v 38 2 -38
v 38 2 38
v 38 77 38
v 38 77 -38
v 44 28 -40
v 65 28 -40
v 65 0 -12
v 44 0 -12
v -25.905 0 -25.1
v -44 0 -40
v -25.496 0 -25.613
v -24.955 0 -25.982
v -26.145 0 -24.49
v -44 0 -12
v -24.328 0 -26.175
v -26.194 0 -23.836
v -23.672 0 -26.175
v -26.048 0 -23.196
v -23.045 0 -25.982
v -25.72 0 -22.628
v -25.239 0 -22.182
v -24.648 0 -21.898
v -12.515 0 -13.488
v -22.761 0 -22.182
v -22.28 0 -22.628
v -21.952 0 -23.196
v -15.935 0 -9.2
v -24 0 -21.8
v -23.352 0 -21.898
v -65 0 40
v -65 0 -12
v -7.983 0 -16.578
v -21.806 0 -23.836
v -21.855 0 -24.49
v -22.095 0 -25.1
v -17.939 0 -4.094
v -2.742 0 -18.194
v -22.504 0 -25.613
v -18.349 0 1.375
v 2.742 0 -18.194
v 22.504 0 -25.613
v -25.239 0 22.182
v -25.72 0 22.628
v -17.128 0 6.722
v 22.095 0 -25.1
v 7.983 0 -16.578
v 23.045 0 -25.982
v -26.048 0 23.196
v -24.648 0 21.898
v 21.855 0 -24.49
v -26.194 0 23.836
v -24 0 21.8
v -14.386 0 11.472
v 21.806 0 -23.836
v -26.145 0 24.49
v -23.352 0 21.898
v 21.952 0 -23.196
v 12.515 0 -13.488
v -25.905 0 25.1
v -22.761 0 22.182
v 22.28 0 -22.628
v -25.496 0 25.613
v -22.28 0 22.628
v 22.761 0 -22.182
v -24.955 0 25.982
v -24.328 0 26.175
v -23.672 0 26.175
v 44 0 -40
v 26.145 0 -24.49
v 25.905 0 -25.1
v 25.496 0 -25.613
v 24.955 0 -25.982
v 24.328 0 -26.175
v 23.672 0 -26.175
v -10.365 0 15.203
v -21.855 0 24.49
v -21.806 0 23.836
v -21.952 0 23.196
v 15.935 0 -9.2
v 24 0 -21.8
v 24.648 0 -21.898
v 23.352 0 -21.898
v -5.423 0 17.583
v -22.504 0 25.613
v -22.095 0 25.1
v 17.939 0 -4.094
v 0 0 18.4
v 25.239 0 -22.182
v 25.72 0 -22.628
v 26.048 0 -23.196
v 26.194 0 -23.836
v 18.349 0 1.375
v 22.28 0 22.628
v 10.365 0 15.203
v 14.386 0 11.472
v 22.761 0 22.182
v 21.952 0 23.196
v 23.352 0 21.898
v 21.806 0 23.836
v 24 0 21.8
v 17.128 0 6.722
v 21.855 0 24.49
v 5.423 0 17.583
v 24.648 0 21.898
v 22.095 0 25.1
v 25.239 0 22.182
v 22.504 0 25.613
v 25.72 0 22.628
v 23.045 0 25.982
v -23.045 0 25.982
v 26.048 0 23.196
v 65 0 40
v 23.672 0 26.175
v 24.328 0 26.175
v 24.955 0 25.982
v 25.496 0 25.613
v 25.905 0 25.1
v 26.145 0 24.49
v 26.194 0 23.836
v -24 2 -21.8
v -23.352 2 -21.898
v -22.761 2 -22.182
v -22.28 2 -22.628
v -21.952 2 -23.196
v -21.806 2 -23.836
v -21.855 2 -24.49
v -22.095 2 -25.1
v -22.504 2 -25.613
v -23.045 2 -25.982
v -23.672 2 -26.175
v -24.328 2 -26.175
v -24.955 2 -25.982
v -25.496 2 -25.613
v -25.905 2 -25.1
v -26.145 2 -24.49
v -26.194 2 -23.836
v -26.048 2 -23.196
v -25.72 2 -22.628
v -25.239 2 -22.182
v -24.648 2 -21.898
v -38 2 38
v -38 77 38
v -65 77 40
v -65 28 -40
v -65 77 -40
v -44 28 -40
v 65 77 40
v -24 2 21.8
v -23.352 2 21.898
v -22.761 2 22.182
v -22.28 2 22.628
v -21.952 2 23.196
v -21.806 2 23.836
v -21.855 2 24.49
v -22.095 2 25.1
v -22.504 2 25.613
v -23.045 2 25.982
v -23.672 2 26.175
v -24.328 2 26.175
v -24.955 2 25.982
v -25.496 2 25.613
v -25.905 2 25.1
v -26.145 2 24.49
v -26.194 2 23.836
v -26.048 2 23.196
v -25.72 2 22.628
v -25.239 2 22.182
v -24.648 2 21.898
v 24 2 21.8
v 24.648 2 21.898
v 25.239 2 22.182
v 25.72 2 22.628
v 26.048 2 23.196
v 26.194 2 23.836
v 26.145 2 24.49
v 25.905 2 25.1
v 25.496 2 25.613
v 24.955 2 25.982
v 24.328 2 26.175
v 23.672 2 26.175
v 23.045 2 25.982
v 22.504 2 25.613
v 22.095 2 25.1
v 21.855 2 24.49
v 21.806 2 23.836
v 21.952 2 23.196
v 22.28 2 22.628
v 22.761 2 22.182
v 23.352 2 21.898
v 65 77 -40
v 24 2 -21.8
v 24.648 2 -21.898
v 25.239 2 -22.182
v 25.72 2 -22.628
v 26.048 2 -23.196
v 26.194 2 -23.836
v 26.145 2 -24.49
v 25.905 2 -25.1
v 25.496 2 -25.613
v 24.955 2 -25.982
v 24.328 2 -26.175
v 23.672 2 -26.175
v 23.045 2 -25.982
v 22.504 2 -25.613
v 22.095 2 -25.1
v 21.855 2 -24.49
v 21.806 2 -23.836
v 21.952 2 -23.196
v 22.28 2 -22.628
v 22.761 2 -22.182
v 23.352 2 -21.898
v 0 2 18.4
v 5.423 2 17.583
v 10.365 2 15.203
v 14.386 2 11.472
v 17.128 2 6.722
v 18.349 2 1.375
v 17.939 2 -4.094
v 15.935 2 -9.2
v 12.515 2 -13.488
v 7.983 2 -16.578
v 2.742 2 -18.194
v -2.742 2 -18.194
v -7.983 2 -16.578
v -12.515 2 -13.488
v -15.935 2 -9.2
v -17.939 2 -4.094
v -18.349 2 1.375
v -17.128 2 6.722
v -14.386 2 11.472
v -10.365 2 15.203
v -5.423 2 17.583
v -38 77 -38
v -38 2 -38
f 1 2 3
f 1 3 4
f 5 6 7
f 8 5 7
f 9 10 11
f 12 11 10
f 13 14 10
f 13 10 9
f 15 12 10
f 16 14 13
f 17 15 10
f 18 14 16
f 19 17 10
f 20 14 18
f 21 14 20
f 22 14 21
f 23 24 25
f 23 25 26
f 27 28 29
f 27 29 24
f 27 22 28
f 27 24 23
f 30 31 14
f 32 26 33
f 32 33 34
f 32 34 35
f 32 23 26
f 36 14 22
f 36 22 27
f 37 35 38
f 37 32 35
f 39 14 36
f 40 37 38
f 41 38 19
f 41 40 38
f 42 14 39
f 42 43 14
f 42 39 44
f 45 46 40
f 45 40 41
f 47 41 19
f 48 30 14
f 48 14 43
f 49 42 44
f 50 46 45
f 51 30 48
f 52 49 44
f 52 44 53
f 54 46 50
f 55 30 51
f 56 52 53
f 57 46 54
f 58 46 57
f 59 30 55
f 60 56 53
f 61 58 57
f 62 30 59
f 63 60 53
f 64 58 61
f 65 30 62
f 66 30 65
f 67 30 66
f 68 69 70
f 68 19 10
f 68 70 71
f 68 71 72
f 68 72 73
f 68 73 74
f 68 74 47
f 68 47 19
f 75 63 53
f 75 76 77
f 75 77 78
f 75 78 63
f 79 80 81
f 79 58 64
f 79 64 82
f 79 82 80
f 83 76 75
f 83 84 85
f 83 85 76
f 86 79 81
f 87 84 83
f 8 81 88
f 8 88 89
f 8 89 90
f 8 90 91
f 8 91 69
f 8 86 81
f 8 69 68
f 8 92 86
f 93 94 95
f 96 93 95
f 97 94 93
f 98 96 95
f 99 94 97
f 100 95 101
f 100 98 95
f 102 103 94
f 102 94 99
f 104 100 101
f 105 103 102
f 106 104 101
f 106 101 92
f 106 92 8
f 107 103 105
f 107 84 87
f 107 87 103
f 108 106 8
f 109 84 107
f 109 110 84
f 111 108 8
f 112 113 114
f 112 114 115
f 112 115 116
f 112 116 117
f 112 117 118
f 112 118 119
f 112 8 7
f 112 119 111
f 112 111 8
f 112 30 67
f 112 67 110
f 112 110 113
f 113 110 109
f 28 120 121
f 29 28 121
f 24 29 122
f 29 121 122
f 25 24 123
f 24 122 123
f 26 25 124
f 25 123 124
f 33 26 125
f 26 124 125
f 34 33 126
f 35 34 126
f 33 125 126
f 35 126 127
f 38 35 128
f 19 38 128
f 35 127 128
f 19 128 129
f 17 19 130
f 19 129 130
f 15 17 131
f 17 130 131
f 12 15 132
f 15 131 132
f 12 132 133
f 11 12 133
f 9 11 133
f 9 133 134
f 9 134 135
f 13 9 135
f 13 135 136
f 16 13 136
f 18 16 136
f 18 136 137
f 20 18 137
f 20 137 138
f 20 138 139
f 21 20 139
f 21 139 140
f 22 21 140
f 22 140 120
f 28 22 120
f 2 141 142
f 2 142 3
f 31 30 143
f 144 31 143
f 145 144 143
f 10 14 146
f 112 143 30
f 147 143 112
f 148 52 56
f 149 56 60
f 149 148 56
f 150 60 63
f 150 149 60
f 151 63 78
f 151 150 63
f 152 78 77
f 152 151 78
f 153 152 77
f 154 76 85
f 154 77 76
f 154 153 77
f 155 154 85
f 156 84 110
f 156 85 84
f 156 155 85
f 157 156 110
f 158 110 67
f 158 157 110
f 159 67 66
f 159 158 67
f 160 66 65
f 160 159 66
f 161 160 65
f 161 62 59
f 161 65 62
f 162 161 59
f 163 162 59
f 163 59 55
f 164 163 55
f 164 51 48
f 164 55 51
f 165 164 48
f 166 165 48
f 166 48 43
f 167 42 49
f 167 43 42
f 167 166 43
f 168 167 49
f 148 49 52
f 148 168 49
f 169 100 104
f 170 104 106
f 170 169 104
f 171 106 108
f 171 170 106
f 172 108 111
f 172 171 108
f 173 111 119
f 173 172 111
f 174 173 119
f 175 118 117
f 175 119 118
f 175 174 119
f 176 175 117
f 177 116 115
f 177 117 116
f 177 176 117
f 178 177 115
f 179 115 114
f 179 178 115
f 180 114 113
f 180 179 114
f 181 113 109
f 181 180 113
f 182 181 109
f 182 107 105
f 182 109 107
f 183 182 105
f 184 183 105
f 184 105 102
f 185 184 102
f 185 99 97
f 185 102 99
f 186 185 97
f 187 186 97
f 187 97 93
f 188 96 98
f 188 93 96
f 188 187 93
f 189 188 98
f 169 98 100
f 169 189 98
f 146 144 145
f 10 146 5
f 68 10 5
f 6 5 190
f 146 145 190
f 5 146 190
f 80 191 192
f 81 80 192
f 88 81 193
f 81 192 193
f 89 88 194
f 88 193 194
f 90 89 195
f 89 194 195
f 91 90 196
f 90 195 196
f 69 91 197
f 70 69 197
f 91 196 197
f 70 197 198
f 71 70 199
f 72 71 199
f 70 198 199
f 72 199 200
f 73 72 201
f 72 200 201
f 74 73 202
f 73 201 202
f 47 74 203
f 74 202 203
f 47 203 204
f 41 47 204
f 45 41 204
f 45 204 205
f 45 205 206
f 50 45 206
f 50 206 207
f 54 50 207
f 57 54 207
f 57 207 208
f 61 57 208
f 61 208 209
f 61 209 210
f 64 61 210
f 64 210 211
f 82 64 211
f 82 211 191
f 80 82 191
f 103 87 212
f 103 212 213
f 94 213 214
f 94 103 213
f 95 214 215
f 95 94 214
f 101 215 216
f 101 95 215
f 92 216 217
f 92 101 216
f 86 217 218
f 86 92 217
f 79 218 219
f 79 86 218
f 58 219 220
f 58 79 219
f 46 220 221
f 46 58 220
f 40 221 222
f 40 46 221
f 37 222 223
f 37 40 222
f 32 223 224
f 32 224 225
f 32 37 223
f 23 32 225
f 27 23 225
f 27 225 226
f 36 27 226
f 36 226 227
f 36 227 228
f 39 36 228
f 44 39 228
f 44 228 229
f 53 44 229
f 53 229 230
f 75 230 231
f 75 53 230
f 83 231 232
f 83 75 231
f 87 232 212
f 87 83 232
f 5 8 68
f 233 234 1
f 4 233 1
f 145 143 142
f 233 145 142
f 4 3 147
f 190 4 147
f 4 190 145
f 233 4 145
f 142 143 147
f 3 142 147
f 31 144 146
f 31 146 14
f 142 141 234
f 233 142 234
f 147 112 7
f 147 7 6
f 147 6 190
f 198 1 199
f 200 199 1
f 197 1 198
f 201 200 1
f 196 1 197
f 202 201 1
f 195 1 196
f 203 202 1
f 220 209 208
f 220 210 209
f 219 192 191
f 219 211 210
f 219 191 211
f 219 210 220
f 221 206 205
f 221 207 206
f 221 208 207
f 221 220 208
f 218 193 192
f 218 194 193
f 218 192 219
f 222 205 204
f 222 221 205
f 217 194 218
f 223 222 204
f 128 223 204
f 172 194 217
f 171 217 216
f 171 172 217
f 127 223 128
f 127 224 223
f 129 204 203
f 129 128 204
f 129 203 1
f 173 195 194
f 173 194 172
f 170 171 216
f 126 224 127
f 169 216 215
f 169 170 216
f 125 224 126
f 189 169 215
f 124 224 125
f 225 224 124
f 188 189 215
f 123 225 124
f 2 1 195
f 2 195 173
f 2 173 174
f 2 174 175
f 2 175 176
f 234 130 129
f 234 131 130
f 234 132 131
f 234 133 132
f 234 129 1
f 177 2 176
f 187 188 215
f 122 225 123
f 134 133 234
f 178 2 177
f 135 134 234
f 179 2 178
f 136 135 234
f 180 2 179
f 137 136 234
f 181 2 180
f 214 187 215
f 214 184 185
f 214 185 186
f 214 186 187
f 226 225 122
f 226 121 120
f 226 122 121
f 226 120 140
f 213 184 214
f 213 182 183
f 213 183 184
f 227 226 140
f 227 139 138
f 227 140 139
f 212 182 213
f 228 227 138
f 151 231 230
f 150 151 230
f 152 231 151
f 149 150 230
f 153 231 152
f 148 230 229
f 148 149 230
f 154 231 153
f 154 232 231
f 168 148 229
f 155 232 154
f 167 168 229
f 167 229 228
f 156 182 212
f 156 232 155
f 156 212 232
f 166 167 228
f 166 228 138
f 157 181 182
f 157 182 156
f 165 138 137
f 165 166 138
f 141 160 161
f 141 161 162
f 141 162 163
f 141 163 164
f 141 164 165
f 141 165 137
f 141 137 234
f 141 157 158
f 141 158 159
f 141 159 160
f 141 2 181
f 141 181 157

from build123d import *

# Parameters (mm, degrees)
SKETCH1_W               = 80
SKETCH1_H               = 80
SKETCH1_R               = 18.4
BOSS_EXTRUDE1_DEPTH     = 2
SKETCH2_W               = 4
SKETCH2_H               = 18.5
BOSS_EXTRUDE2_DEPTH     = 15.25
SKETCH3_R               = 2.2
CUT_EXTRUDE1_DEPTH      = 94.976393312
MIRROR2_COPY_1_SKETCH_W = 4
MIRROR2_COPY_1_SKETCH_H = 18.5
MIRROR2_COPY_1_DEPTH    = 15.25
MIRROR2_COPY_2_SKETCH_R = 2.2
MIRROR2_COPY_2_DEPTH    = 94.976393312
SKETCH4_R               = 2.2
CUT_EXTRUDE2_DEPTH      = 62.388618652
SKETCH5_W               = 4
SKETCH5_H               = 15.25
CUT_EXTRUDE3_DEPTH      = 93.258129723
SKETCH6_W               = 80
SKETCH6_H               = 80
SKETCH6_W_2             = 76
SKETCH6_H_2             = 76
BOSS_EXTRUDE3_DEPTH     = 75
SKETCH7_W               = 25
SKETCH7_H               = 77
BOSS_EXTRUDE4_DEPTH     = 80
CUT_EXTRUDE5_DEPTH      = 21


with BuildPart() as part:
    # Sketch1 → Boss-Extrude1 (new body)
    with BuildSketch(Plane(origin=(0, 0, 0), x_dir=(1, 0, 0), z_dir=(0, 1, 0))):
        Rectangle(SKETCH1_W, SKETCH1_H)
        with Locations(Location((0, 0, 0), (0, 0, 270))):
            Circle(SKETCH1_R, mode=Mode.SUBTRACT)
    extrude(amount=BOSS_EXTRUDE1_DEPTH)

    # Sketch2 → Boss-Extrude2 (add)
    with BuildSketch(Plane(origin=(0, 2, 0), x_dir=(1, 0, 0), z_dir=(0, 1, 0))):
        with Locations((42, -30.75)):
            Rectangle(SKETCH2_W, SKETCH2_H)
    boss_extrude2 = extrude(amount=-BOSS_EXTRUDE2_DEPTH)

    # Sketch3 → Cut-Extrude1 (cut, through all)
    with BuildSketch(Plane(origin=(44, 0, 0), x_dir=(0, 0, -1), z_dir=(1, 0, 0))):
        with Locations((-30.75, -8.125)):
            Circle(SKETCH3_R)
    cut_extrude1 = extrude(amount=-CUT_EXTRUDE1_DEPTH, mode=Mode.SUBTRACT)

    # Mirror1: Boss-Extrude2, Cut-Extrude1 across plane
    add(boss_extrude2.mirror(Plane(origin=(0, 0, 0), x_dir=(0, 0, 1), z_dir=(1, 0, 0))))
    add(cut_extrude1.mirror(Plane(origin=(0, 0, 0), x_dir=(0, 0, 1), z_dir=(1, 0, 0))), mode=Mode.SUBTRACT)

    # Mirror2: Boss-Extrude2, Cut-Extrude1 across plane
    add(boss_extrude2.mirror(Plane(origin=(0, 0, 0), x_dir=(1, 0, 0), z_dir=(0, 0, -1))))
    add(cut_extrude1.mirror(Plane(origin=(0, 0, 0), x_dir=(1, 0, 0), z_dir=(0, 0, -1))), mode=Mode.SUBTRACT)

    # Mirror2 copy 1 sketch → Mirror2 copy 1 (add)
    with BuildSketch(Plane(origin=(0, 2, 0), x_dir=(-1, 0, 0), z_dir=(0, 1, 0))):
        with Locations((42, -30.75)):
            Rectangle(MIRROR2_COPY_1_SKETCH_W, MIRROR2_COPY_1_SKETCH_H)
    extrude(amount=-MIRROR2_COPY_1_DEPTH)

    # Mirror2 copy 2 sketch → Mirror2 copy 2 (cut, through all)
    with BuildSketch(Plane.ZY.offset(44)):
        with Locations((-30.75, -8.125)):
            Circle(MIRROR2_COPY_2_SKETCH_R)
    extrude(amount=-MIRROR2_COPY_2_DEPTH, mode=Mode.SUBTRACT)

    # Sketch4 → Cut-Extrude2 (cut, through all)
    with BuildSketch(Plane(origin=(0, 2, 0), x_dir=(1, 0, 0), z_dir=(0, 1, 0))):
        with Locations(Location((-24, 24, 0), (0, 0, 270))):
            Circle(SKETCH4_R)
        with Locations(Location((24, 24, 0), (0, 0, 270))):
            Circle(SKETCH4_R)
    cut_extrude2 = extrude(amount=-CUT_EXTRUDE2_DEPTH, mode=Mode.SUBTRACT)

    # Mirror3: Cut-Extrude2 across plane
    add(cut_extrude2.mirror(Plane(origin=(0, 0, 0), x_dir=(1, 0, 0), z_dir=(0, 0, -1))), mode=Mode.SUBTRACT)

    # Sketch5 → Cut-Extrude3 (cut, through all)
    with BuildSketch(Plane.XY.offset(40)):
        with Locations((-42, -5.625)):
            Rectangle(SKETCH5_W, SKETCH5_H)
        with Locations((42, -5.625)):
            Rectangle(SKETCH5_W, SKETCH5_H)
    extrude(amount=-CUT_EXTRUDE3_DEPTH, mode=Mode.SUBTRACT)

    # Sketch6 → Boss-Extrude3 (add)
    with BuildSketch(Plane(origin=(0, 2, 0), x_dir=(1, 0, 0), z_dir=(0, 1, 0))):
        Rectangle(SKETCH6_W, SKETCH6_H)
        Rectangle(SKETCH6_W_2, SKETCH6_H_2, mode=Mode.SUBTRACT)
    extrude(amount=BOSS_EXTRUDE3_DEPTH)

    # Sketch7 → Boss-Extrude4 (add)
    with BuildSketch(Plane.XY.offset(40)):
        with Locations((-52.5, 38.5)):
            Rectangle(SKETCH7_W, SKETCH7_H)
        with Locations((52.5, 38.5)):
            Rectangle(SKETCH7_W, SKETCH7_H)
    extrude(amount=-BOSS_EXTRUDE4_DEPTH)

    # Sketch9 → Cut-Extrude5 (cut)
    with BuildSketch(Plane(origin=(65, 0, 0), x_dir=(0, 0, -1), z_dir=(1, 0, 0))):
        Polygon((40, 0), (40, 28), (12, 0), align=None)
    cut_extrude5 = extrude(amount=-CUT_EXTRUDE5_DEPTH, mode=Mode.SUBTRACT)

    # Mirror4: Cut-Extrude5 across plane
    add(cut_extrude5.mirror(Plane(origin=(0, 0, 0), x_dir=(0, 0, 1), z_dir=(1, 0, 0))), mode=Mode.SUBTRACT)


solid = part.part
